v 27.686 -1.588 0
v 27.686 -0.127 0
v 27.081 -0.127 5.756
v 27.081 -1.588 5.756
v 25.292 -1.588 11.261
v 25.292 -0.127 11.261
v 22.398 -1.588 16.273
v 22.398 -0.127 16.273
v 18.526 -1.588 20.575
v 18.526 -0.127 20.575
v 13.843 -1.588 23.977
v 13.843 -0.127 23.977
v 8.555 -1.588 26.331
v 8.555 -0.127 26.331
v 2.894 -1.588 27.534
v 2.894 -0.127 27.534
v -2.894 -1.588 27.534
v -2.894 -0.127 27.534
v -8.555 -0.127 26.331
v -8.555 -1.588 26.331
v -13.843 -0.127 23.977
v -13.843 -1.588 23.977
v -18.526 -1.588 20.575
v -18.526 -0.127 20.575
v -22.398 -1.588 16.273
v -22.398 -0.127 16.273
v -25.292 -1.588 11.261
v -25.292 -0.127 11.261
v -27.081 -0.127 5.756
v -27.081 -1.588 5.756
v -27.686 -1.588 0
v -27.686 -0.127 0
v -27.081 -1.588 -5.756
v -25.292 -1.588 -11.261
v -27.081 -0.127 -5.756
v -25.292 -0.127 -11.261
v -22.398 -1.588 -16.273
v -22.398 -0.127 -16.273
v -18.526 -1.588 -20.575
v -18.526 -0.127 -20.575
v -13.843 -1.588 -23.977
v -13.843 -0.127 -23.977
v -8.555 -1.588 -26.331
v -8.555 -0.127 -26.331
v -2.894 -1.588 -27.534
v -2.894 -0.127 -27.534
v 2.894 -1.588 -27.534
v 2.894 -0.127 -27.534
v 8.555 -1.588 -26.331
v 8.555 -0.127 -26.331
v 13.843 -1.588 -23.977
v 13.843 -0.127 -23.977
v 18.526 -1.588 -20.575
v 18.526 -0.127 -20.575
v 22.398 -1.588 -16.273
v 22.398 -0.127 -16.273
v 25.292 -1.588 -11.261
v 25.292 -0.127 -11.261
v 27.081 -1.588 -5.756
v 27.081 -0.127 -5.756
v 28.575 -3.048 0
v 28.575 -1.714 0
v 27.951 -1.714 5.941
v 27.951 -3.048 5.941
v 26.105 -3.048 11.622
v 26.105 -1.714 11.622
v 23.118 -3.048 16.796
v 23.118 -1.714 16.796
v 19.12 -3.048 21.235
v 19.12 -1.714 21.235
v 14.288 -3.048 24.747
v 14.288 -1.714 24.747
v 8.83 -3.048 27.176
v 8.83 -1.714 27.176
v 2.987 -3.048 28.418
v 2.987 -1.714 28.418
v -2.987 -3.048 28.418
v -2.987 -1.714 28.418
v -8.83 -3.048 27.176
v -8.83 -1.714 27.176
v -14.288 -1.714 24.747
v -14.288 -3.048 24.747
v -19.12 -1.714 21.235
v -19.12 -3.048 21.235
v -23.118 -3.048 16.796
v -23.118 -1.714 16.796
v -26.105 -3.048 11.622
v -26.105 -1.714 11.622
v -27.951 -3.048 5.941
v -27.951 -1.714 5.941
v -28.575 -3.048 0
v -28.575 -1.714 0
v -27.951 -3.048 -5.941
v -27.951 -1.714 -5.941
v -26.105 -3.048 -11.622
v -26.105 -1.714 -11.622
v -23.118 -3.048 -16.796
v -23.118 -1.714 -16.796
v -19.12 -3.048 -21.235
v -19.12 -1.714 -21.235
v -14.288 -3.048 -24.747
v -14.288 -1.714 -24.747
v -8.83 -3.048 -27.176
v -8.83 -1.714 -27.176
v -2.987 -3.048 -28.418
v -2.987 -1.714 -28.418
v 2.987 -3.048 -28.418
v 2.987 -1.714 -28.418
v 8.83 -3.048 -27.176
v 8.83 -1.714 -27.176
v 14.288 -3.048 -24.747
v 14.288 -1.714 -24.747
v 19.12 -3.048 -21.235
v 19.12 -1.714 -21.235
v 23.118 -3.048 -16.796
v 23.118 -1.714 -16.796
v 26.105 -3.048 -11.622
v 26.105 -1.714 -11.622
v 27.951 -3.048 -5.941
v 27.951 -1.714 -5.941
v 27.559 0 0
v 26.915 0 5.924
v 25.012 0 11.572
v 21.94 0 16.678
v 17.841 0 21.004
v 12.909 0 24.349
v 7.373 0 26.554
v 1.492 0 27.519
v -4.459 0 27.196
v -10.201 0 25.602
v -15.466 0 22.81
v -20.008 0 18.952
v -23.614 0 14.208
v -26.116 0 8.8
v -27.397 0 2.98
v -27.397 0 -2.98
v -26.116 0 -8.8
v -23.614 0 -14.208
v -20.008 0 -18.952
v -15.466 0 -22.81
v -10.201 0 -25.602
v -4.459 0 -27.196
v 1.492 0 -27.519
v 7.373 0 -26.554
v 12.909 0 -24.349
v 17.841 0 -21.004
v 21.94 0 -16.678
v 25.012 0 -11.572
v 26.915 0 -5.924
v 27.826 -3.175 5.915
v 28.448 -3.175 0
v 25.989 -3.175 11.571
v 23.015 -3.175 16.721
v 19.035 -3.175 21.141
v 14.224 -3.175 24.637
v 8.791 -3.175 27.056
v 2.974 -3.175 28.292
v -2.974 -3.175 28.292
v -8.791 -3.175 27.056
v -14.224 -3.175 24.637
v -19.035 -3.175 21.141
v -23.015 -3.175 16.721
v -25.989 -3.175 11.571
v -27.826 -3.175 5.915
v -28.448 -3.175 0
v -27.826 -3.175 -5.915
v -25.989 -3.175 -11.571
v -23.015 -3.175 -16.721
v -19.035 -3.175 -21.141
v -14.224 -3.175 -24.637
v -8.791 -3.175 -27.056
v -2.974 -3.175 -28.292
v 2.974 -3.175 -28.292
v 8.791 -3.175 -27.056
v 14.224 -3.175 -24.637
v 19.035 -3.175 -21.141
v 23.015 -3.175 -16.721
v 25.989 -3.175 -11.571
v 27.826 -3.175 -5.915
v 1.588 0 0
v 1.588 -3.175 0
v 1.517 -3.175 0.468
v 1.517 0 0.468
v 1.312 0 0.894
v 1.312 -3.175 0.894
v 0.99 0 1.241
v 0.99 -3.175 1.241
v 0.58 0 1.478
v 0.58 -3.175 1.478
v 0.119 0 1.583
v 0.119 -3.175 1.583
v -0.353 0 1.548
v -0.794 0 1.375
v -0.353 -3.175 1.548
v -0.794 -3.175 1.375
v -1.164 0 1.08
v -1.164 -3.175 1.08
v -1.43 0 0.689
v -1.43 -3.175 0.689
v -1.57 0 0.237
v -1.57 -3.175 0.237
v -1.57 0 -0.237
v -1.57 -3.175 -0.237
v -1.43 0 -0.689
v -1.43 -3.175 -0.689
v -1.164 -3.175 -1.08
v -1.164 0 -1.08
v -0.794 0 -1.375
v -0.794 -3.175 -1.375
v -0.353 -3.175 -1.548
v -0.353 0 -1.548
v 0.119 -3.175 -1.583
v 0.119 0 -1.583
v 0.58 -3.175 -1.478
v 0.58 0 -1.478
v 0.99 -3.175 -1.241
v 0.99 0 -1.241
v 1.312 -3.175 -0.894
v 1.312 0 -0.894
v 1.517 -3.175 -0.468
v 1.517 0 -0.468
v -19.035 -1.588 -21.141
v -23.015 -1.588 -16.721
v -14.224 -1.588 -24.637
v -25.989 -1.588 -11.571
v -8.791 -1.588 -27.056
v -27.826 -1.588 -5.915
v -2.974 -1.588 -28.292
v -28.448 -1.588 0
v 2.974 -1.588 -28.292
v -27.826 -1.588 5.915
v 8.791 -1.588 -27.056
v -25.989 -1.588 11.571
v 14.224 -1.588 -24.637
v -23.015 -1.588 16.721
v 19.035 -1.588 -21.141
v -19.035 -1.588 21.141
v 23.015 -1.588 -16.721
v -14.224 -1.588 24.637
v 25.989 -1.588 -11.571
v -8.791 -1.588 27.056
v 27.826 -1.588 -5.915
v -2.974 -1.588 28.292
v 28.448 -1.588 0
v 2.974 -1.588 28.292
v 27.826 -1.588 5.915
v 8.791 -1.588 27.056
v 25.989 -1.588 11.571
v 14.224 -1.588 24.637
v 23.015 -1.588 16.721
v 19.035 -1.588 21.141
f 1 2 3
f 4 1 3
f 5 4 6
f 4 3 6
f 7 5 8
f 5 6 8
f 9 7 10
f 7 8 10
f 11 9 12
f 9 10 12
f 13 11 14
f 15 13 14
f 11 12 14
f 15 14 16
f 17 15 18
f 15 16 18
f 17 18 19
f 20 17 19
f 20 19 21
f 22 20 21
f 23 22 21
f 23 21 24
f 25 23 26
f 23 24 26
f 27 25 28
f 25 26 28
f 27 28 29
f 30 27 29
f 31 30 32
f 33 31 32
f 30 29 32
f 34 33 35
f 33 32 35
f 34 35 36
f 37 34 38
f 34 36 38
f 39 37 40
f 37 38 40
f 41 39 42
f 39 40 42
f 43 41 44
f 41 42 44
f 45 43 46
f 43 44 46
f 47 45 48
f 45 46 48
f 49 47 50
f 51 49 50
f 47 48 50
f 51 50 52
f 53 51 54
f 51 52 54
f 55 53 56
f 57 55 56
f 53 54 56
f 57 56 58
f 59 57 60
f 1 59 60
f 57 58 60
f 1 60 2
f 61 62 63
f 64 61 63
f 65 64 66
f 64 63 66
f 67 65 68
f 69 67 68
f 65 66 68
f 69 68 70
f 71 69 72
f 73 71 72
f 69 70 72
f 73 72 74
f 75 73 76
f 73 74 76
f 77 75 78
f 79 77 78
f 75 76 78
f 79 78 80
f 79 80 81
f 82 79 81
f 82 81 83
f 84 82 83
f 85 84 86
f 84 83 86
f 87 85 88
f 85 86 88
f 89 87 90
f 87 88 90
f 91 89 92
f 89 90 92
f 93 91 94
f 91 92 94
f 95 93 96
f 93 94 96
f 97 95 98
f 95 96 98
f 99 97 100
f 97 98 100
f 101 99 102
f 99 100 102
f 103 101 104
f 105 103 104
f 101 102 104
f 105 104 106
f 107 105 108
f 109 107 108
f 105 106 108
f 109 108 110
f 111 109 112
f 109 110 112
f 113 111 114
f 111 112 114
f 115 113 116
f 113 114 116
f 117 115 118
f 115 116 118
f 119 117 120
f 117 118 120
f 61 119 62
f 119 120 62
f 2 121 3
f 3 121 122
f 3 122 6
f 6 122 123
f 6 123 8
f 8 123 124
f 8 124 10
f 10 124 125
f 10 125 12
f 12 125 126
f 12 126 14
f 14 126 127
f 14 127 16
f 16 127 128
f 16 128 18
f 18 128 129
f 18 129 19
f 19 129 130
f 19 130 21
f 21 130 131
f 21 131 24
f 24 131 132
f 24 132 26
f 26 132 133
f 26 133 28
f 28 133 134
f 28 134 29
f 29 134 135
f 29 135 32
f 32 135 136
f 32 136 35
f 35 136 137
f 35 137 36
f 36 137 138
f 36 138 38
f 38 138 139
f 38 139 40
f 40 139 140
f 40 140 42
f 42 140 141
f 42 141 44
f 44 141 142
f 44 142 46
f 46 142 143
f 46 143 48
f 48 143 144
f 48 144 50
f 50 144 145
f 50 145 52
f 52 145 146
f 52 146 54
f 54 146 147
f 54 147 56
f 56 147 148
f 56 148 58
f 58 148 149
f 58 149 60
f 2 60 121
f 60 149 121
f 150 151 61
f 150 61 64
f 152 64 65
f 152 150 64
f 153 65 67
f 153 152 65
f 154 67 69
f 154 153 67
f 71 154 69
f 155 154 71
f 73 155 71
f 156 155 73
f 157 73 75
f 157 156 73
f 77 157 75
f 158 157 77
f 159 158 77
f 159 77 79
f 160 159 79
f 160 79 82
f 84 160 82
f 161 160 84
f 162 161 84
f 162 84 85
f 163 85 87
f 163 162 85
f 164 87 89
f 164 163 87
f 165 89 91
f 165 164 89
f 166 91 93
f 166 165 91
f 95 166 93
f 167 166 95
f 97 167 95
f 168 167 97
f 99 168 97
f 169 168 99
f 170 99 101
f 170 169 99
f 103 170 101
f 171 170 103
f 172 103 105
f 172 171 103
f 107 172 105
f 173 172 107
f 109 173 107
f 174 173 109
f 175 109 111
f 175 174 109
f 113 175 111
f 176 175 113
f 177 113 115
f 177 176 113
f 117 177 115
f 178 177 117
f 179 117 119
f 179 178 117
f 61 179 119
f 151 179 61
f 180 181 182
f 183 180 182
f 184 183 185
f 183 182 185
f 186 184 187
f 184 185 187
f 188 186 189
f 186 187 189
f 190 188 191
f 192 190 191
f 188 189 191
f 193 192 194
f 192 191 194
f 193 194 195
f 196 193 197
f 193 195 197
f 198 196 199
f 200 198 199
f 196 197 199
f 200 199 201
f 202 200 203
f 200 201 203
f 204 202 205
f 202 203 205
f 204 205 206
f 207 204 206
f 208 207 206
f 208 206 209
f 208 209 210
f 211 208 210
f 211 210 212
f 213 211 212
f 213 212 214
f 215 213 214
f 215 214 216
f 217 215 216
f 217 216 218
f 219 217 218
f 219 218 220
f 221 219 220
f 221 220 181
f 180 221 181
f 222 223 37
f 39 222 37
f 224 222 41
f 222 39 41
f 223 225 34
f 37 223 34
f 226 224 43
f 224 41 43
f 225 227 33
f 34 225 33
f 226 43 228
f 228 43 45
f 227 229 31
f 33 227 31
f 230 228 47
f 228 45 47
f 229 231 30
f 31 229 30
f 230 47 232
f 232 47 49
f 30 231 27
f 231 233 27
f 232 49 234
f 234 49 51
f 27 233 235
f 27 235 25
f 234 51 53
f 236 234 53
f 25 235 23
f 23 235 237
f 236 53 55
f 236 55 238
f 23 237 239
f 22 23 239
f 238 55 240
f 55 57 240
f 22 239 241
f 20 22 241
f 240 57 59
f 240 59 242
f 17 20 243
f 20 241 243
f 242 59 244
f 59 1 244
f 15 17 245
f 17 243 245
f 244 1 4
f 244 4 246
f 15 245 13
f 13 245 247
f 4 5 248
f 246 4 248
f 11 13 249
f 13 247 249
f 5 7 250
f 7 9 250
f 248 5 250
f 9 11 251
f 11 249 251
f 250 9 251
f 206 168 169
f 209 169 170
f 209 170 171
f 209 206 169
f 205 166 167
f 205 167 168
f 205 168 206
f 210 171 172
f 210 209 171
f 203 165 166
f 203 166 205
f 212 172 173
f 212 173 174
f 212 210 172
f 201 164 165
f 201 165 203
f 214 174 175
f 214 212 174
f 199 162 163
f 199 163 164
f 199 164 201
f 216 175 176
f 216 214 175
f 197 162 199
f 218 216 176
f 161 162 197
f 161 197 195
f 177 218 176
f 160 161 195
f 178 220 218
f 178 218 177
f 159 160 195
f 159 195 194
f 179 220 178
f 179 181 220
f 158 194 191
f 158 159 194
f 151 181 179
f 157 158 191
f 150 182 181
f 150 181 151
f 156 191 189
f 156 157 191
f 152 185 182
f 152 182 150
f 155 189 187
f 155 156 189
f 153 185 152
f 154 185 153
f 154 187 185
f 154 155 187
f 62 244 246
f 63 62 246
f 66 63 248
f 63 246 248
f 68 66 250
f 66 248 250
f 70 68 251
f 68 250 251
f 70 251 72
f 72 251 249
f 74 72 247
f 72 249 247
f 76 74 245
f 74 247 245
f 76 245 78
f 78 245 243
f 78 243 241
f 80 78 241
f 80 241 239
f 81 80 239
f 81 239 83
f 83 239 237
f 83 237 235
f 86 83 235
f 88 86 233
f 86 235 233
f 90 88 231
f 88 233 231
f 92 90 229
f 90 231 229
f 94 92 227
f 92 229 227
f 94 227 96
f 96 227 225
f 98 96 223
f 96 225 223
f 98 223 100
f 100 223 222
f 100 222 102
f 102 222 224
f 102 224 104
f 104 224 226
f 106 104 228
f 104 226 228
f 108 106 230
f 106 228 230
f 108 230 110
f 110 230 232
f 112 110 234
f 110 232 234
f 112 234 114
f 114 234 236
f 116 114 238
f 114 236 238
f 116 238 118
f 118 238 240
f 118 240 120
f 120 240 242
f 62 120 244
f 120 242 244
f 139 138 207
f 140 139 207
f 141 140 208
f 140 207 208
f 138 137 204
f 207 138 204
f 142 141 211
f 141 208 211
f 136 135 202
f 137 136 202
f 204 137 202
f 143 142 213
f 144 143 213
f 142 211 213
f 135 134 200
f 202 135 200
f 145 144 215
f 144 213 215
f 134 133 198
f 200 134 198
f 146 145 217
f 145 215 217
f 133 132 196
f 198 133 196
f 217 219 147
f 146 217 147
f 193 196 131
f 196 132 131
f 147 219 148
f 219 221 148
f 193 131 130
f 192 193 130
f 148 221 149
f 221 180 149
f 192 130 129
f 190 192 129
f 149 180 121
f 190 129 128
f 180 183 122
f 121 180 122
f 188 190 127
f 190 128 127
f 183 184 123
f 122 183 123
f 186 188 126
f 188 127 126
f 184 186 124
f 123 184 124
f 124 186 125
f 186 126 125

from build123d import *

# Parameters (mm, degrees)
F0_R     = 27.686
F1_DEPTH = 1.5875
F2_R     = 28.575
F3_DEPTH = 1.5875
F4_R     = 1.5875
F5_DEPTH = 3.176
F6_SIZE  = 0.127


with BuildPart() as f1:
    # F0 (on Front) → F1 (new body)
    with BuildSketch(Plane.XZ):
        Circle(F0_R)
    extrude(amount=F1_DEPTH)

    # F2 (on face) → F3 (join)
    with BuildSketch(Plane.XZ.offset(1.5875)):
        Circle(F2_R)
    extrude(amount=F3_DEPTH)

    # F4 (on face) → F5 (cut, through all)
    with BuildSketch(Plane.XZ.offset(3.175)):
        Circle(F4_R)
    extrude(amount=-F5_DEPTH, mode=Mode.SUBTRACT)

    # F6
    f6_edges = [f1.edges().sort_by_distance(p)[0] for p in [
        (-28.575, -3.175, 0),
        (-27.686, 0, 0),
        (-28.575, -1.5875, 0),
    ]]
    chamfer(f6_edges, length=F6_SIZE)


solid = f1.part
